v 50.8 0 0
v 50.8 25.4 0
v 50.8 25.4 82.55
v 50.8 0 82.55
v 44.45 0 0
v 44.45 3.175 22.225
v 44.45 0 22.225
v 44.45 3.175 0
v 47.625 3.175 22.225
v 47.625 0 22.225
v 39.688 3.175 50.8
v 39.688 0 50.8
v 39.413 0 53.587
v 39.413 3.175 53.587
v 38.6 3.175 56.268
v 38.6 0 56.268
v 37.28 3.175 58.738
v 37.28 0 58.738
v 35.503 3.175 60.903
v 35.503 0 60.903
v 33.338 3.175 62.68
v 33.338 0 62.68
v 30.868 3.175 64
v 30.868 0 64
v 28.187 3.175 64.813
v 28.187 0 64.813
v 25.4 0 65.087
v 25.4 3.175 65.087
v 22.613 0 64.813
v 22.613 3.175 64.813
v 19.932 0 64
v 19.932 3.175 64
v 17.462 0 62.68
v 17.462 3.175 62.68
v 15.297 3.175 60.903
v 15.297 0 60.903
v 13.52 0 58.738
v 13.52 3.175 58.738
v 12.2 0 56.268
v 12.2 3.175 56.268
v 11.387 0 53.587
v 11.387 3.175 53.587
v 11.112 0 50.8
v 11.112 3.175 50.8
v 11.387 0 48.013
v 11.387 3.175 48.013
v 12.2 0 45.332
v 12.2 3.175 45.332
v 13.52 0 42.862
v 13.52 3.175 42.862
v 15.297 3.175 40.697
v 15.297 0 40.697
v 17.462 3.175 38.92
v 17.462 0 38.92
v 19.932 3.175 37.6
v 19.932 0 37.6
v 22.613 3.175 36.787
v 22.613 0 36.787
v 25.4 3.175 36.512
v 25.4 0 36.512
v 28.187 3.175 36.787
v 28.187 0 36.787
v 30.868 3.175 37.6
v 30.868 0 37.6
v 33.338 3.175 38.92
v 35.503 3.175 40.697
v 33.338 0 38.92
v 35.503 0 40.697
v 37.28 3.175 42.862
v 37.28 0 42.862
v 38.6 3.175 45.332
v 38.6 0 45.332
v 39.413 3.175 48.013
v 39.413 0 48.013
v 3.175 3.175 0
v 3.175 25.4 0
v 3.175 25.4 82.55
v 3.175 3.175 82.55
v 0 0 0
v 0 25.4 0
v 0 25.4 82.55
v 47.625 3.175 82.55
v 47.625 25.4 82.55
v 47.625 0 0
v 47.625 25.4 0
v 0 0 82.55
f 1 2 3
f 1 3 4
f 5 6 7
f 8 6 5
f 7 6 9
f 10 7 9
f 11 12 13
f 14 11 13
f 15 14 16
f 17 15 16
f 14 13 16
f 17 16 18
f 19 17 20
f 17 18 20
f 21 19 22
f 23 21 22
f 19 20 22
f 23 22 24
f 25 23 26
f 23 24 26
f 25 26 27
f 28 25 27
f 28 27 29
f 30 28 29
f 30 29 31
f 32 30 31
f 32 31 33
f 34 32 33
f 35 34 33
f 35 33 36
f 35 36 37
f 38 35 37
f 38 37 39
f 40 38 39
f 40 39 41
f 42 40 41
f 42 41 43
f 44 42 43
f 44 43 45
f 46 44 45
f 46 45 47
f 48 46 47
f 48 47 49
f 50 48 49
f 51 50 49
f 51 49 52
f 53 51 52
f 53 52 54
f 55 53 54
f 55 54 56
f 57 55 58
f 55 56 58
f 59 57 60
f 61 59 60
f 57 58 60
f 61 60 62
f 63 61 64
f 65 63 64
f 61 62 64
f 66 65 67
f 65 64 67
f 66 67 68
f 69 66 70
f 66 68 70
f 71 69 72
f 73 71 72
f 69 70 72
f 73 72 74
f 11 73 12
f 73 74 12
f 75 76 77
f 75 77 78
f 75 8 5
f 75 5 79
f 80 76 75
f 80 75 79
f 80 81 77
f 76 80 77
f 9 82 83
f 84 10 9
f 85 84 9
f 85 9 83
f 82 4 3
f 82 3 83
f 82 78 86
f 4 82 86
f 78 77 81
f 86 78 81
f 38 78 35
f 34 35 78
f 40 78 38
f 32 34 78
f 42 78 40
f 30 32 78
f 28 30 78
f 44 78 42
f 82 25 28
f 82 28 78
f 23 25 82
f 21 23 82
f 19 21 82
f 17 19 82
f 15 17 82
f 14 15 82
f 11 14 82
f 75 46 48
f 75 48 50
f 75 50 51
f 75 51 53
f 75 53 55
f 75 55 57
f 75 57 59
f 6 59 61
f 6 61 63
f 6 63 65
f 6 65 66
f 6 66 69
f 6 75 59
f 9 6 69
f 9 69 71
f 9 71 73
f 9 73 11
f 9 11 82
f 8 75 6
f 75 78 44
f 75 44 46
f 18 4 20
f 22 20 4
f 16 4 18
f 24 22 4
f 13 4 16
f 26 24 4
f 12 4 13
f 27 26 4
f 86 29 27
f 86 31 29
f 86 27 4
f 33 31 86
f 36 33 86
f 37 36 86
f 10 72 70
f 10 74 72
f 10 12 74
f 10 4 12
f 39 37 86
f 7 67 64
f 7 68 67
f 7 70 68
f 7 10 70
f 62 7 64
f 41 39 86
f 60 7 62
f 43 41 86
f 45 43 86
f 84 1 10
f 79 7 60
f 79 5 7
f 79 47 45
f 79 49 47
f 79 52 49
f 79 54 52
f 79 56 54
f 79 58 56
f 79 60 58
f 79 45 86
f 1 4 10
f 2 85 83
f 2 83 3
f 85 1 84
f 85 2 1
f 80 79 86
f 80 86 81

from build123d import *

# Parameters (mm, degrees)
BOSS_EXTRUDE1_DEPTH = 82.55
CUT_EXTRUDE1_REACH  = 27.4
SKETCH2_R           = 14.2875
CUT_EXTRUDE2_REACH  = 5.175
SKETCH3_W           = 3.175
SKETCH3_H           = 22.225


with BuildPart() as part:
    # Sketch1 → Boss-Extrude1 (new body)
    with BuildSketch(Plane.XY):
        Polygon((47.625, 3.175), (47.625, 25.4), (50.8, 25.4), (50.8, 0), (0, 0), (0, 25.4), (3.175, 25.4), (3.175, 3.175), align=None)
    extrude(amount=BOSS_EXTRUDE1_DEPTH)

    # Sketch2 → Cut-Extrude1 (cut, up to next)
    with BuildSketch(Plane.XZ, mode=Mode.PRIVATE) as cut_extrude1_sk1:
        with Locations((25.4, 50.8)):
            Circle(SKETCH2_R)
    cut_extrude1_tool1 = extrude(cut_extrude1_sk1.sketch, amount=-CUT_EXTRUDE1_REACH, mode=Mode.PRIVATE) & part.part
    add(cut_extrude1_tool1.solids().sort_by_distance((25.4, 0, 50.8))[0], mode=Mode.SUBTRACT)

    # Sketch3 → Cut-Extrude2 (cut, up to next)
    with BuildSketch(Plane(origin=(0, 3.175, 0), x_dir=(1, 0, 0), z_dir=(0, 1, 0)), mode=Mode.PRIVATE) as cut_extrude2_sk1:
        with Locations((46.0375, -11.1125)):
            Rectangle(SKETCH3_W, SKETCH3_H)
    cut_extrude2_tool1 = extrude(cut_extrude2_sk1.sketch, amount=-CUT_EXTRUDE2_REACH, mode=Mode.PRIVATE) & part.part
    add(cut_extrude2_tool1.solids().sort_by_distance((46.0375, 3.175, 11.1125))[0], mode=Mode.SUBTRACT)


solid = part.part
